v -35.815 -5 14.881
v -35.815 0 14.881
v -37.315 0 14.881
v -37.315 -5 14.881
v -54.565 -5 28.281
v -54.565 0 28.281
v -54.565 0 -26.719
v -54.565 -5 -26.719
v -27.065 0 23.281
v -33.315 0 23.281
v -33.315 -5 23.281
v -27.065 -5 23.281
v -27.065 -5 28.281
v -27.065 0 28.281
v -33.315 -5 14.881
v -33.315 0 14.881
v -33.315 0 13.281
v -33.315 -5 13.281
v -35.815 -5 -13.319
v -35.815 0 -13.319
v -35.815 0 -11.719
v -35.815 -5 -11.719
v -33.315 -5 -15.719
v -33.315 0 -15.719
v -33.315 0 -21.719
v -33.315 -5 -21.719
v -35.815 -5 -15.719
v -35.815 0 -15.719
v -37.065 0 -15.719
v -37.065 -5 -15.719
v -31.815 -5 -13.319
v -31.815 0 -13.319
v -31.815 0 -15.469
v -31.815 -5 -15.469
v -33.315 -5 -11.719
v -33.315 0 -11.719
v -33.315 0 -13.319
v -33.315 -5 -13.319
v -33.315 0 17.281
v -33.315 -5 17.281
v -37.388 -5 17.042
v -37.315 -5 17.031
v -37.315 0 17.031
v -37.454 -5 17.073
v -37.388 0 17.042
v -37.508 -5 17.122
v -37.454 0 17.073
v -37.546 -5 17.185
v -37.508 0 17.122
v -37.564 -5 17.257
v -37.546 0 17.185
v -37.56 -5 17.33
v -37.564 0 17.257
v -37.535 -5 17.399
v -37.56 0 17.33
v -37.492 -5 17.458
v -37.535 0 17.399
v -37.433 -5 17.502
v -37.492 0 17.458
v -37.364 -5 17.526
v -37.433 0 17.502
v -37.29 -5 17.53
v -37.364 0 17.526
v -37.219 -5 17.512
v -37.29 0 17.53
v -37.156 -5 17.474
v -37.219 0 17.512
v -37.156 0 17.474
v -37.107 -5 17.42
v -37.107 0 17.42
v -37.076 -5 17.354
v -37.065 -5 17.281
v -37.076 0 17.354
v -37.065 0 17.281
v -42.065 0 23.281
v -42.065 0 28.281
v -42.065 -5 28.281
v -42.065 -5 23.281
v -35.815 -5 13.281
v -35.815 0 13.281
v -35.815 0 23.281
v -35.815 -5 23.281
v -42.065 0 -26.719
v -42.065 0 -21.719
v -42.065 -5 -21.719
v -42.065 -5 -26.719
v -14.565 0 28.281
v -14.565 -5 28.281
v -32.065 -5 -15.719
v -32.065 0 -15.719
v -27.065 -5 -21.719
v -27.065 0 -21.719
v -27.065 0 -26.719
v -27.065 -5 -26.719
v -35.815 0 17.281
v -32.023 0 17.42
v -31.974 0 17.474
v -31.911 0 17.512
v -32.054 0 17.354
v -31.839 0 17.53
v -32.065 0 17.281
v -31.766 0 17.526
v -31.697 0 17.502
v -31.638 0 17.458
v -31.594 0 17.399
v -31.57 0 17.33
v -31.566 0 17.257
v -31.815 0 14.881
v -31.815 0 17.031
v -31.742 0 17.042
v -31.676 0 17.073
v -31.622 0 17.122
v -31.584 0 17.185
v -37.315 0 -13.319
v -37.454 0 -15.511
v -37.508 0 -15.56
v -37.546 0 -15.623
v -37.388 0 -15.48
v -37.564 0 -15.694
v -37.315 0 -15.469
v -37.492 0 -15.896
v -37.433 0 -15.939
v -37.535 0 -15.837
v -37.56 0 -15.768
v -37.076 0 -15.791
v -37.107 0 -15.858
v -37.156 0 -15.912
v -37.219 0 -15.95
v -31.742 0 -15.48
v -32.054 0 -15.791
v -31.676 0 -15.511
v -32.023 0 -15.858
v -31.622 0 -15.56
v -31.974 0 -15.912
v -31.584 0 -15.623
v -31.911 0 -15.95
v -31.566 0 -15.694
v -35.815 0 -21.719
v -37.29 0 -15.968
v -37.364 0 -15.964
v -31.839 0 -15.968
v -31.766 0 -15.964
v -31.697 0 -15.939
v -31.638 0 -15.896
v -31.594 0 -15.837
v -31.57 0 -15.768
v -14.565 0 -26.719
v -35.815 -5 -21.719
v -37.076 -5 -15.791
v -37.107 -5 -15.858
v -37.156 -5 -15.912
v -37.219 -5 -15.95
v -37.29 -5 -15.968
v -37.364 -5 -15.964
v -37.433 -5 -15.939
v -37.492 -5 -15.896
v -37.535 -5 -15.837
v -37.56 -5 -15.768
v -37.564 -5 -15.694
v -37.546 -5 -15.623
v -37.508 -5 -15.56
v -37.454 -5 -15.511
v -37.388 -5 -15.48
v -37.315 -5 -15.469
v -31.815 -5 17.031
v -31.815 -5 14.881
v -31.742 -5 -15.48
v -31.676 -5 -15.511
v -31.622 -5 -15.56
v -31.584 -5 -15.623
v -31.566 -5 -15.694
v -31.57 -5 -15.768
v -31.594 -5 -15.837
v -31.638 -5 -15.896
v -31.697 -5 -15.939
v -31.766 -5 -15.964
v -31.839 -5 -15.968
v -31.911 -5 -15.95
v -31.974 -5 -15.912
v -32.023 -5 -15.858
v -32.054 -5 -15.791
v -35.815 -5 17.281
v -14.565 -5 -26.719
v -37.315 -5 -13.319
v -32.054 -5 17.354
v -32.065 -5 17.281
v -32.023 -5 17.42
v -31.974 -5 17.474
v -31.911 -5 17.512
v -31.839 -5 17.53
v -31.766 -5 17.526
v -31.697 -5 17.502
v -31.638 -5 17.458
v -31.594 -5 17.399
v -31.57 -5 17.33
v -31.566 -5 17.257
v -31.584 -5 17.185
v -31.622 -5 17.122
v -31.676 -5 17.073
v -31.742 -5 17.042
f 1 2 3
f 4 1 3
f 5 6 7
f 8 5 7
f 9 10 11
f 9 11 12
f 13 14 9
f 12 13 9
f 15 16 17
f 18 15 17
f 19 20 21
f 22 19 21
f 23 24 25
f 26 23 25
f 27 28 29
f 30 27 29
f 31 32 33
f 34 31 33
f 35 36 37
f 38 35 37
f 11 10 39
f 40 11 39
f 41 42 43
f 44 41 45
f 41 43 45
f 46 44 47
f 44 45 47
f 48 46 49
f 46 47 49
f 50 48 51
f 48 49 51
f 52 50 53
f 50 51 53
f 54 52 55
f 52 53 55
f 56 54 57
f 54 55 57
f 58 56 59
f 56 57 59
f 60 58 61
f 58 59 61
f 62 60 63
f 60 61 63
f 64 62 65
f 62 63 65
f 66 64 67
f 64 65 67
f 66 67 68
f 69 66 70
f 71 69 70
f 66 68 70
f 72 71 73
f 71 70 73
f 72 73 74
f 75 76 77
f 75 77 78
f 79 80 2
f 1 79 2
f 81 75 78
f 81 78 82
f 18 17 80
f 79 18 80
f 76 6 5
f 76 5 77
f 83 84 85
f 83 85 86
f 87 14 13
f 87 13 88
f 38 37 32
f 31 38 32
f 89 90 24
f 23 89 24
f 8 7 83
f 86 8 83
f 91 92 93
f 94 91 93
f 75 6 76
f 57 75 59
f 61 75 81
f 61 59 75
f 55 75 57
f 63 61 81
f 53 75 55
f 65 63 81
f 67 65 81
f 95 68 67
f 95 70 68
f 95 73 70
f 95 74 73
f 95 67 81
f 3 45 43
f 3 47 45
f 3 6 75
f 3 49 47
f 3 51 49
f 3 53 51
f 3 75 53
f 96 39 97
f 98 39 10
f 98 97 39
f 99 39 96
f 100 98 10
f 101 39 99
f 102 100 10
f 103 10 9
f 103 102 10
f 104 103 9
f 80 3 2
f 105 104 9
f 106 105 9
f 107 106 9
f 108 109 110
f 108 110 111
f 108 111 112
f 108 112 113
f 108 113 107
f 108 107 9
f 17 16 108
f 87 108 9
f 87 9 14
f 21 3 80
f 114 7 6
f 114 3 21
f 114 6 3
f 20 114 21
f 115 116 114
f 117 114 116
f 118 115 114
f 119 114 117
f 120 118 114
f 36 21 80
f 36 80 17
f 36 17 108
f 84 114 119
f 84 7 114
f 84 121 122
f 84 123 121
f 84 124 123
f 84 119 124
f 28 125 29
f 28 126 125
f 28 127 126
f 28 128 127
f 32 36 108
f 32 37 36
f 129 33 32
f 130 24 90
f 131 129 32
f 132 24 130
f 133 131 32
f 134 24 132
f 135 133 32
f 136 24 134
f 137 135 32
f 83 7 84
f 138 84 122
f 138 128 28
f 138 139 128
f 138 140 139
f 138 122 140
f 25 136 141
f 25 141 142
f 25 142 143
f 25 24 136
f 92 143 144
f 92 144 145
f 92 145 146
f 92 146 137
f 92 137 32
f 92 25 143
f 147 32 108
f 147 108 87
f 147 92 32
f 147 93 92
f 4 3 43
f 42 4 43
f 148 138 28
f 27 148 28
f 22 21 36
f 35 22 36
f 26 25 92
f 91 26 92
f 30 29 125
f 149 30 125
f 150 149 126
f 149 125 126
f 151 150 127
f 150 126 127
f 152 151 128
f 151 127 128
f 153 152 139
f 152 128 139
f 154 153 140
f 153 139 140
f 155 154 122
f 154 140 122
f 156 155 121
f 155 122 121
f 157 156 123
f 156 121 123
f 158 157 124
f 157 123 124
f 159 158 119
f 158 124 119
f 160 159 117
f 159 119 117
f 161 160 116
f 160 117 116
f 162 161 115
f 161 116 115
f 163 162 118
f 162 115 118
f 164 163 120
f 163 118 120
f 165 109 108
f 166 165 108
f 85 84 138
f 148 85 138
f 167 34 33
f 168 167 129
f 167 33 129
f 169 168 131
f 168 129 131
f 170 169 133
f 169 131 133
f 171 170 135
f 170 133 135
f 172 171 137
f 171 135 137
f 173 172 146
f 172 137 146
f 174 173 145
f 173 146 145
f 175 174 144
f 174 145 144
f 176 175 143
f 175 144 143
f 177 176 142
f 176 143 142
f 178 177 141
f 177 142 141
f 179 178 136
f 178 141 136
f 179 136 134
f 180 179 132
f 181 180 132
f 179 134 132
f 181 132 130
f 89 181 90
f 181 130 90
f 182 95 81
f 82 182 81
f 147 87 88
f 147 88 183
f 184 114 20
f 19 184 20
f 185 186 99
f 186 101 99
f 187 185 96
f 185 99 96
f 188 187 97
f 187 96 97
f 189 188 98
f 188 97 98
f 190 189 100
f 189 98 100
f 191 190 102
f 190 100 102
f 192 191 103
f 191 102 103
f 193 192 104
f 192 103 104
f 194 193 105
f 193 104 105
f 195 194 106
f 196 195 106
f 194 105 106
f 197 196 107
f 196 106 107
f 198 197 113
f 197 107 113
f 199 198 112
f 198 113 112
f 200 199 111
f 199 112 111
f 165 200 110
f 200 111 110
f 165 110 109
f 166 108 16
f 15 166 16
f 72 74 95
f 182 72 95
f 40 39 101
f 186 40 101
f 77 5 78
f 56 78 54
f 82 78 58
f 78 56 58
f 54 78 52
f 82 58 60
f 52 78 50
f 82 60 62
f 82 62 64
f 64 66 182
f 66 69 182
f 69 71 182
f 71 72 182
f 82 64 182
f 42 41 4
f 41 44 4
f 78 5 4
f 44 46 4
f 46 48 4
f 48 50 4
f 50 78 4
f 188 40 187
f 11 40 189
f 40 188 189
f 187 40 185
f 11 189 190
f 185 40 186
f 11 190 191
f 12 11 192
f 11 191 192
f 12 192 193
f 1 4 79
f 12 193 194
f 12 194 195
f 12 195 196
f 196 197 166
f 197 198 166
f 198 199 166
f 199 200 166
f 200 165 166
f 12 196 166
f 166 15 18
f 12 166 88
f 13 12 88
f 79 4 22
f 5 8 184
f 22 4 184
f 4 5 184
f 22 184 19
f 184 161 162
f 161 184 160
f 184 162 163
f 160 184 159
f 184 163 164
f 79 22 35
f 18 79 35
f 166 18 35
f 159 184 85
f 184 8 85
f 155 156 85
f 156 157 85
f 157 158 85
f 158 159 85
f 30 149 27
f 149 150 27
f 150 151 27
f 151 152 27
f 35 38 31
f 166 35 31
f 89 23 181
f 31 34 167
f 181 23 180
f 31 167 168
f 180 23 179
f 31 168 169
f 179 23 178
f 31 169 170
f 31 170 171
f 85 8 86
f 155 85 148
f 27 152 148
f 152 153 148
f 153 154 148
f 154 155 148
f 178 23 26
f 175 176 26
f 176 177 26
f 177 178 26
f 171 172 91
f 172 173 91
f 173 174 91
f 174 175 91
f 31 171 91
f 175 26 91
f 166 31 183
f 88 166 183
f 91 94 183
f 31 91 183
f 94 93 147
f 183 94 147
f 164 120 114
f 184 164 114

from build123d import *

# Parameters (mm, degrees)
SCHIZZO1_W                   = 40
SCHIZZO1_H                   = 55
ESTRUSIONE_ESTRUSIONE2_DEPTH = 5
SCHIZZO2_W                   = 15
SCHIZZO2_H                   = 5
TAGLIO_ESTRUSIONE1_DEPTH     = 6
TAGLIO_ESTRUSIONE3_DEPTH     = 6
SCHIZZO4_R                   = 0.25
TAGLIO_ESTRUSIONE4_DEPTH     = 10


with BuildPart() as part:
    # Schizzo1 → Estrusione-Estrusione2 (new body)
    with BuildSketch(Plane(origin=(0, 0, 0), x_dir=(1, 0, 0), z_dir=(0, 1, 0))):
        with Locations((-34.56494914, -0.781075862)):
            Rectangle(SCHIZZO1_W, SCHIZZO1_H)
    extrude(amount=-ESTRUSIONE_ESTRUSIONE2_DEPTH)

    # Schizzo2 → Taglio-Estrusione1 (cut, through all)
    with BuildSketch(Plane(origin=(0, 0, 0), x_dir=(1, 0, 0), z_dir=(0, 1, 0))):
        with Locations((-34.56494914, -25.781075862)):
            Rectangle(SCHIZZO2_W, SCHIZZO2_H)
        with Locations((-34.56494914, 24.218924138)):
            Rectangle(SCHIZZO2_W, SCHIZZO2_H)
    extrude(amount=-TAGLIO_ESTRUSIONE1_DEPTH, mode=Mode.SUBTRACT)

    # Schizzo3 → Taglio-Estrusione3 (cut, through all)
    with BuildSketch(Plane(origin=(0, 0, 0), x_dir=(1, 0, 0), z_dir=(0, 1, 0))):
        Polygon((-35.81494914, -23.281075862), (-33.31494914, -23.281075862), (-33.31494914, -17.281075862), (-31.81494914, -17.281075862), (-31.81494914, -14.881075862), (-33.31494914, -14.881075862), (-33.31494914, -13.281075862), (-35.81494914, -13.281075862), (-35.81494914, -14.881075862), (-37.31494914, -14.881075862), (-37.31494914, -17.281075862), (-35.81494914, -17.281075862), align=None)
        Polygon((-35.81494914, 11.718924138), (-33.31494914, 11.718924138), (-33.31494914, 13.318924138), (-31.81494914, 13.318924138), (-31.81494914, 15.718924138), (-33.31494914, 15.718924138), (-33.31494914, 21.718924138), (-35.81494914, 21.718924138), (-35.81494914, 15.718924138), (-37.31494914, 15.718924138), (-37.31494914, 13.318924138), (-35.81494914, 13.318924138), align=None)
    extrude(amount=-TAGLIO_ESTRUSIONE3_DEPTH, mode=Mode.SUBTRACT)

    # Schizzo4 → Taglio-Estrusione4 (cut)
    with BuildSketch(Plane(origin=(0, 0, 0), x_dir=(1, 0, 0), z_dir=(0, 1, 0))):
        with Locations((-37.31494914, -17.281075862)):
            Circle(SCHIZZO4_R)
        with Locations((-31.81494914, -17.281075862)):
            Circle(SCHIZZO4_R)
        with Locations((-37.31494914, 15.718924138)):
            Circle(SCHIZZO4_R)
        with Locations((-31.81494914, 15.718924138)):
            Circle(SCHIZZO4_R)
    extrude(amount=-TAGLIO_ESTRUSIONE4_DEPTH, mode=Mode.SUBTRACT)


solid = part.part
